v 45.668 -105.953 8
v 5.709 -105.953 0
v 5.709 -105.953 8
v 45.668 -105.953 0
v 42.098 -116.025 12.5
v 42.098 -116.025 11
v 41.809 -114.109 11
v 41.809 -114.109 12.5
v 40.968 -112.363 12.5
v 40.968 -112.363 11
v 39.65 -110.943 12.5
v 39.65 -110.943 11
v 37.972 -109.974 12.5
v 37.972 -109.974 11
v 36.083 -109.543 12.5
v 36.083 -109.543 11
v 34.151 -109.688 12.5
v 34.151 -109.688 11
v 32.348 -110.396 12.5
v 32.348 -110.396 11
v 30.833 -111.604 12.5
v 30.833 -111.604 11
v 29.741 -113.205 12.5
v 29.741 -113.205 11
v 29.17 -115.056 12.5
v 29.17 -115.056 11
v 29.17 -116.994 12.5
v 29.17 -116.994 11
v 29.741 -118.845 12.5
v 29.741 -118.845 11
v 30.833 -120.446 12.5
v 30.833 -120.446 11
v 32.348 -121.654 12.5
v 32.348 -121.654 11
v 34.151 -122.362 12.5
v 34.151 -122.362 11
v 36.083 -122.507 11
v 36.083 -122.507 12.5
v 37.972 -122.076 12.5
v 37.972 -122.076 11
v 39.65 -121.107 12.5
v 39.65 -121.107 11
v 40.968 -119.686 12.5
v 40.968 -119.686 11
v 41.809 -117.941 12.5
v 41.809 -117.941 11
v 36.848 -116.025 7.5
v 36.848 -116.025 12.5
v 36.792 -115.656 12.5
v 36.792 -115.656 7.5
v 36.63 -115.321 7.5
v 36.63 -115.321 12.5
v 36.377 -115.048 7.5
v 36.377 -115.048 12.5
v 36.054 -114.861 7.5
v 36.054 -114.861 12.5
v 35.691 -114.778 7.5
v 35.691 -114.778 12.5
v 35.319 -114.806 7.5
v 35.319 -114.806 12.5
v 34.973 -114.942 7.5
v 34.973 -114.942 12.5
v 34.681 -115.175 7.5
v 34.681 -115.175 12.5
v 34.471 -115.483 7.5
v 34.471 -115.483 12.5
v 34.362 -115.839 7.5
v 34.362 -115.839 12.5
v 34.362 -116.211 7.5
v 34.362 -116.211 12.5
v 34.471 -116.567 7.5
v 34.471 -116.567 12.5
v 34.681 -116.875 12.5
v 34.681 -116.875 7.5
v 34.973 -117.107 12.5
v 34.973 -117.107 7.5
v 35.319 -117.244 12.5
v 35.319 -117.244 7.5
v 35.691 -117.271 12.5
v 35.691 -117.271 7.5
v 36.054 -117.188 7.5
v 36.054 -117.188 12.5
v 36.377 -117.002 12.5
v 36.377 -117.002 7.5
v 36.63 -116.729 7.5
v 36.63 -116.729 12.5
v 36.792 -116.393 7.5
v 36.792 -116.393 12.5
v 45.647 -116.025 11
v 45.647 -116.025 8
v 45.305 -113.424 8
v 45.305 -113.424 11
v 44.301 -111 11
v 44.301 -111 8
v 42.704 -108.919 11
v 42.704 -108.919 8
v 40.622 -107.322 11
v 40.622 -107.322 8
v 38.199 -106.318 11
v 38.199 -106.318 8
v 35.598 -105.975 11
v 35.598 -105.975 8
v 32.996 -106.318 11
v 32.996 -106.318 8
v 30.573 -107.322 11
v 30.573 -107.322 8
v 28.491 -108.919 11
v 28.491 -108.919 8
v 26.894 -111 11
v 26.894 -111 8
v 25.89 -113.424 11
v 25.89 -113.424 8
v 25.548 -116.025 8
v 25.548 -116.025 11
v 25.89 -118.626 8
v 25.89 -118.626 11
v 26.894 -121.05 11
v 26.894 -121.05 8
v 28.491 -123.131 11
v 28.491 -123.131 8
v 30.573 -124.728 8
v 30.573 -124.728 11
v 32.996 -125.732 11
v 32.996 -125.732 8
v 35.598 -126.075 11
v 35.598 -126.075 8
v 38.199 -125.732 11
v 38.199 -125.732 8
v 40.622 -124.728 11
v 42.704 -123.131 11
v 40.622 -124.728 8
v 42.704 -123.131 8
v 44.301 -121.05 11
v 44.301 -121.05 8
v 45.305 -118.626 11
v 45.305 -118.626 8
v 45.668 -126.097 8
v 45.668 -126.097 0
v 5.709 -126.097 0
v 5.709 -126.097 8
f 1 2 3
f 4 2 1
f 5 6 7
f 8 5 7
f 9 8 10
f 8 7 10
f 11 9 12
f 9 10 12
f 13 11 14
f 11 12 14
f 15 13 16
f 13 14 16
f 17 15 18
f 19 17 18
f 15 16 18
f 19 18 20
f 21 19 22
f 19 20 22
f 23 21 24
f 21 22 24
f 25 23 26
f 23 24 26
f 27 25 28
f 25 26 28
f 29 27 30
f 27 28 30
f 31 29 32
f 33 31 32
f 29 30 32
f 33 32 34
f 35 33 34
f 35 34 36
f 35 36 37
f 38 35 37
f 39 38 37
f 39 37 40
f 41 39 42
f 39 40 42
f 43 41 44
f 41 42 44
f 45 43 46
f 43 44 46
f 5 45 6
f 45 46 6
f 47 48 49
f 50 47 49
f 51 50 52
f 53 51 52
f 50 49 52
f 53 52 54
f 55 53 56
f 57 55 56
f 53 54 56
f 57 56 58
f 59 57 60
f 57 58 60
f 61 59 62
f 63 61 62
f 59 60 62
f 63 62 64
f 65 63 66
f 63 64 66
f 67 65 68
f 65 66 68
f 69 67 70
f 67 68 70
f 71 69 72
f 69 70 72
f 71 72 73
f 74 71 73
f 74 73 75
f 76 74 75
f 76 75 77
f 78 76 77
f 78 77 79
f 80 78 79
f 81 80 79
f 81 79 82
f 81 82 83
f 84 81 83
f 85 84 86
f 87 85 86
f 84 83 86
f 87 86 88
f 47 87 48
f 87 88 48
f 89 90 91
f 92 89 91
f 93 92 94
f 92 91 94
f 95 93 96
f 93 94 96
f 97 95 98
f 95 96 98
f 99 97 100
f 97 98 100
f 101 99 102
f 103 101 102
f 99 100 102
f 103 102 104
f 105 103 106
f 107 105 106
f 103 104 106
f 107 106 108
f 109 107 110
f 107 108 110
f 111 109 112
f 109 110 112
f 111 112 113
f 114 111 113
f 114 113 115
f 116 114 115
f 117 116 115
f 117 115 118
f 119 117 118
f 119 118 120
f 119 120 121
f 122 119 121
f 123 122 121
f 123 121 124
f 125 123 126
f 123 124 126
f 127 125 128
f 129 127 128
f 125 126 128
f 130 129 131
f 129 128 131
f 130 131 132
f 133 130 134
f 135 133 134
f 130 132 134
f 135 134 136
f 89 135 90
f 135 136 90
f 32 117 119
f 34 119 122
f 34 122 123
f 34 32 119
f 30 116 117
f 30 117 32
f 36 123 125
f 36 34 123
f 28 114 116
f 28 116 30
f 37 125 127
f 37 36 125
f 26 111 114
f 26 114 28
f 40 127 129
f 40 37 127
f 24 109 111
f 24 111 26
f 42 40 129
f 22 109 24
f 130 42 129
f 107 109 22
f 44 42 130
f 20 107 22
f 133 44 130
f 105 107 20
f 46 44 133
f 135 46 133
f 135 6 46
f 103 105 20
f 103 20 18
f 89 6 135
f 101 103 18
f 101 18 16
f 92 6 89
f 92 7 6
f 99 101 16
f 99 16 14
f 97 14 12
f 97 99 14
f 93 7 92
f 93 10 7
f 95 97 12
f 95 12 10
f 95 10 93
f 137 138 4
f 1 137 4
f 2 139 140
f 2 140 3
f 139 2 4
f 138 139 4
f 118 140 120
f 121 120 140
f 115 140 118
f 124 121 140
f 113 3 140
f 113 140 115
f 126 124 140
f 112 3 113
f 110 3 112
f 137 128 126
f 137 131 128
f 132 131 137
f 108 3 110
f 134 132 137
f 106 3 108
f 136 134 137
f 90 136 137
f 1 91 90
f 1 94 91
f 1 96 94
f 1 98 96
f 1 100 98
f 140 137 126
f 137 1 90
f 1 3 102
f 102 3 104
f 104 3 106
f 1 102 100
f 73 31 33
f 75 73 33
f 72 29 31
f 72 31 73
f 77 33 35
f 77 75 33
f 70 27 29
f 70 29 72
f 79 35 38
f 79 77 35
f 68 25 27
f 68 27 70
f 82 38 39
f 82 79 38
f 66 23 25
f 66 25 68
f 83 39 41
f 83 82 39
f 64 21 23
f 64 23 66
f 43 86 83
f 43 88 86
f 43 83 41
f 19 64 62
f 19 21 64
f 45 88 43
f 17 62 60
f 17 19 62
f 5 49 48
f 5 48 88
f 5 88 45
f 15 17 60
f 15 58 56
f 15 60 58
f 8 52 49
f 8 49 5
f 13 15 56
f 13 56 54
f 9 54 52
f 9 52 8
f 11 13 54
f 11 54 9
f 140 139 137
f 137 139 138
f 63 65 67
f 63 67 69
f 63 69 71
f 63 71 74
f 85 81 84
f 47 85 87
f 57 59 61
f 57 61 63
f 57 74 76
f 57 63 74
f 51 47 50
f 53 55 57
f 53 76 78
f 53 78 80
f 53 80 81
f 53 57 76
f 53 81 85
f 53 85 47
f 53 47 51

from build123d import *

# Parameters (mm, degrees)
SKETCH1_W           = 39.958127878
SKETCH1_H           = 20.143584626
BOSS_EXTRUDE1_DEPTH = 8
SKETCH2_R           = 10.049780621
BOSS_EXTRUDE2_DEPTH = 3
SKETCH3_R           = 6.5
BOSS_EXTRUDE3_DEPTH = 1.5
SKETCH4_R           = 1.25
CUT_EXTRUDE1_DEPTH  = 5


with BuildPart() as part:
    # Sketch1 → Boss-Extrude1 (new body)
    with BuildSketch(Plane.XY):
        with Locations((25.688484617, -116.024886289)):
            Rectangle(SKETCH1_W, SKETCH1_H)
    extrude(amount=BOSS_EXTRUDE1_DEPTH)

    # Sketch2 → Boss-Extrude2 (add)
    with BuildSketch(Plane.XY.offset(8)):
        with Locations((35.597548556, -116.024886289)):
            Circle(SKETCH2_R)
    extrude(amount=BOSS_EXTRUDE2_DEPTH)

    # Sketch3 → Boss-Extrude3 (add)
    with BuildSketch(Plane.XY.offset(11)):
        with Locations((35.597548556, -116.024886289)):
            Circle(SKETCH3_R)
    extrude(amount=BOSS_EXTRUDE3_DEPTH)

    # Sketch4 → Cut-Extrude1 (cut)
    with BuildSketch(Plane.XY.offset(12.5)):
        with Locations((35.597548556, -116.024886289)):
            Circle(SKETCH4_R)
    extrude(amount=-CUT_EXTRUDE1_DEPTH, mode=Mode.SUBTRACT)


solid = part.part
